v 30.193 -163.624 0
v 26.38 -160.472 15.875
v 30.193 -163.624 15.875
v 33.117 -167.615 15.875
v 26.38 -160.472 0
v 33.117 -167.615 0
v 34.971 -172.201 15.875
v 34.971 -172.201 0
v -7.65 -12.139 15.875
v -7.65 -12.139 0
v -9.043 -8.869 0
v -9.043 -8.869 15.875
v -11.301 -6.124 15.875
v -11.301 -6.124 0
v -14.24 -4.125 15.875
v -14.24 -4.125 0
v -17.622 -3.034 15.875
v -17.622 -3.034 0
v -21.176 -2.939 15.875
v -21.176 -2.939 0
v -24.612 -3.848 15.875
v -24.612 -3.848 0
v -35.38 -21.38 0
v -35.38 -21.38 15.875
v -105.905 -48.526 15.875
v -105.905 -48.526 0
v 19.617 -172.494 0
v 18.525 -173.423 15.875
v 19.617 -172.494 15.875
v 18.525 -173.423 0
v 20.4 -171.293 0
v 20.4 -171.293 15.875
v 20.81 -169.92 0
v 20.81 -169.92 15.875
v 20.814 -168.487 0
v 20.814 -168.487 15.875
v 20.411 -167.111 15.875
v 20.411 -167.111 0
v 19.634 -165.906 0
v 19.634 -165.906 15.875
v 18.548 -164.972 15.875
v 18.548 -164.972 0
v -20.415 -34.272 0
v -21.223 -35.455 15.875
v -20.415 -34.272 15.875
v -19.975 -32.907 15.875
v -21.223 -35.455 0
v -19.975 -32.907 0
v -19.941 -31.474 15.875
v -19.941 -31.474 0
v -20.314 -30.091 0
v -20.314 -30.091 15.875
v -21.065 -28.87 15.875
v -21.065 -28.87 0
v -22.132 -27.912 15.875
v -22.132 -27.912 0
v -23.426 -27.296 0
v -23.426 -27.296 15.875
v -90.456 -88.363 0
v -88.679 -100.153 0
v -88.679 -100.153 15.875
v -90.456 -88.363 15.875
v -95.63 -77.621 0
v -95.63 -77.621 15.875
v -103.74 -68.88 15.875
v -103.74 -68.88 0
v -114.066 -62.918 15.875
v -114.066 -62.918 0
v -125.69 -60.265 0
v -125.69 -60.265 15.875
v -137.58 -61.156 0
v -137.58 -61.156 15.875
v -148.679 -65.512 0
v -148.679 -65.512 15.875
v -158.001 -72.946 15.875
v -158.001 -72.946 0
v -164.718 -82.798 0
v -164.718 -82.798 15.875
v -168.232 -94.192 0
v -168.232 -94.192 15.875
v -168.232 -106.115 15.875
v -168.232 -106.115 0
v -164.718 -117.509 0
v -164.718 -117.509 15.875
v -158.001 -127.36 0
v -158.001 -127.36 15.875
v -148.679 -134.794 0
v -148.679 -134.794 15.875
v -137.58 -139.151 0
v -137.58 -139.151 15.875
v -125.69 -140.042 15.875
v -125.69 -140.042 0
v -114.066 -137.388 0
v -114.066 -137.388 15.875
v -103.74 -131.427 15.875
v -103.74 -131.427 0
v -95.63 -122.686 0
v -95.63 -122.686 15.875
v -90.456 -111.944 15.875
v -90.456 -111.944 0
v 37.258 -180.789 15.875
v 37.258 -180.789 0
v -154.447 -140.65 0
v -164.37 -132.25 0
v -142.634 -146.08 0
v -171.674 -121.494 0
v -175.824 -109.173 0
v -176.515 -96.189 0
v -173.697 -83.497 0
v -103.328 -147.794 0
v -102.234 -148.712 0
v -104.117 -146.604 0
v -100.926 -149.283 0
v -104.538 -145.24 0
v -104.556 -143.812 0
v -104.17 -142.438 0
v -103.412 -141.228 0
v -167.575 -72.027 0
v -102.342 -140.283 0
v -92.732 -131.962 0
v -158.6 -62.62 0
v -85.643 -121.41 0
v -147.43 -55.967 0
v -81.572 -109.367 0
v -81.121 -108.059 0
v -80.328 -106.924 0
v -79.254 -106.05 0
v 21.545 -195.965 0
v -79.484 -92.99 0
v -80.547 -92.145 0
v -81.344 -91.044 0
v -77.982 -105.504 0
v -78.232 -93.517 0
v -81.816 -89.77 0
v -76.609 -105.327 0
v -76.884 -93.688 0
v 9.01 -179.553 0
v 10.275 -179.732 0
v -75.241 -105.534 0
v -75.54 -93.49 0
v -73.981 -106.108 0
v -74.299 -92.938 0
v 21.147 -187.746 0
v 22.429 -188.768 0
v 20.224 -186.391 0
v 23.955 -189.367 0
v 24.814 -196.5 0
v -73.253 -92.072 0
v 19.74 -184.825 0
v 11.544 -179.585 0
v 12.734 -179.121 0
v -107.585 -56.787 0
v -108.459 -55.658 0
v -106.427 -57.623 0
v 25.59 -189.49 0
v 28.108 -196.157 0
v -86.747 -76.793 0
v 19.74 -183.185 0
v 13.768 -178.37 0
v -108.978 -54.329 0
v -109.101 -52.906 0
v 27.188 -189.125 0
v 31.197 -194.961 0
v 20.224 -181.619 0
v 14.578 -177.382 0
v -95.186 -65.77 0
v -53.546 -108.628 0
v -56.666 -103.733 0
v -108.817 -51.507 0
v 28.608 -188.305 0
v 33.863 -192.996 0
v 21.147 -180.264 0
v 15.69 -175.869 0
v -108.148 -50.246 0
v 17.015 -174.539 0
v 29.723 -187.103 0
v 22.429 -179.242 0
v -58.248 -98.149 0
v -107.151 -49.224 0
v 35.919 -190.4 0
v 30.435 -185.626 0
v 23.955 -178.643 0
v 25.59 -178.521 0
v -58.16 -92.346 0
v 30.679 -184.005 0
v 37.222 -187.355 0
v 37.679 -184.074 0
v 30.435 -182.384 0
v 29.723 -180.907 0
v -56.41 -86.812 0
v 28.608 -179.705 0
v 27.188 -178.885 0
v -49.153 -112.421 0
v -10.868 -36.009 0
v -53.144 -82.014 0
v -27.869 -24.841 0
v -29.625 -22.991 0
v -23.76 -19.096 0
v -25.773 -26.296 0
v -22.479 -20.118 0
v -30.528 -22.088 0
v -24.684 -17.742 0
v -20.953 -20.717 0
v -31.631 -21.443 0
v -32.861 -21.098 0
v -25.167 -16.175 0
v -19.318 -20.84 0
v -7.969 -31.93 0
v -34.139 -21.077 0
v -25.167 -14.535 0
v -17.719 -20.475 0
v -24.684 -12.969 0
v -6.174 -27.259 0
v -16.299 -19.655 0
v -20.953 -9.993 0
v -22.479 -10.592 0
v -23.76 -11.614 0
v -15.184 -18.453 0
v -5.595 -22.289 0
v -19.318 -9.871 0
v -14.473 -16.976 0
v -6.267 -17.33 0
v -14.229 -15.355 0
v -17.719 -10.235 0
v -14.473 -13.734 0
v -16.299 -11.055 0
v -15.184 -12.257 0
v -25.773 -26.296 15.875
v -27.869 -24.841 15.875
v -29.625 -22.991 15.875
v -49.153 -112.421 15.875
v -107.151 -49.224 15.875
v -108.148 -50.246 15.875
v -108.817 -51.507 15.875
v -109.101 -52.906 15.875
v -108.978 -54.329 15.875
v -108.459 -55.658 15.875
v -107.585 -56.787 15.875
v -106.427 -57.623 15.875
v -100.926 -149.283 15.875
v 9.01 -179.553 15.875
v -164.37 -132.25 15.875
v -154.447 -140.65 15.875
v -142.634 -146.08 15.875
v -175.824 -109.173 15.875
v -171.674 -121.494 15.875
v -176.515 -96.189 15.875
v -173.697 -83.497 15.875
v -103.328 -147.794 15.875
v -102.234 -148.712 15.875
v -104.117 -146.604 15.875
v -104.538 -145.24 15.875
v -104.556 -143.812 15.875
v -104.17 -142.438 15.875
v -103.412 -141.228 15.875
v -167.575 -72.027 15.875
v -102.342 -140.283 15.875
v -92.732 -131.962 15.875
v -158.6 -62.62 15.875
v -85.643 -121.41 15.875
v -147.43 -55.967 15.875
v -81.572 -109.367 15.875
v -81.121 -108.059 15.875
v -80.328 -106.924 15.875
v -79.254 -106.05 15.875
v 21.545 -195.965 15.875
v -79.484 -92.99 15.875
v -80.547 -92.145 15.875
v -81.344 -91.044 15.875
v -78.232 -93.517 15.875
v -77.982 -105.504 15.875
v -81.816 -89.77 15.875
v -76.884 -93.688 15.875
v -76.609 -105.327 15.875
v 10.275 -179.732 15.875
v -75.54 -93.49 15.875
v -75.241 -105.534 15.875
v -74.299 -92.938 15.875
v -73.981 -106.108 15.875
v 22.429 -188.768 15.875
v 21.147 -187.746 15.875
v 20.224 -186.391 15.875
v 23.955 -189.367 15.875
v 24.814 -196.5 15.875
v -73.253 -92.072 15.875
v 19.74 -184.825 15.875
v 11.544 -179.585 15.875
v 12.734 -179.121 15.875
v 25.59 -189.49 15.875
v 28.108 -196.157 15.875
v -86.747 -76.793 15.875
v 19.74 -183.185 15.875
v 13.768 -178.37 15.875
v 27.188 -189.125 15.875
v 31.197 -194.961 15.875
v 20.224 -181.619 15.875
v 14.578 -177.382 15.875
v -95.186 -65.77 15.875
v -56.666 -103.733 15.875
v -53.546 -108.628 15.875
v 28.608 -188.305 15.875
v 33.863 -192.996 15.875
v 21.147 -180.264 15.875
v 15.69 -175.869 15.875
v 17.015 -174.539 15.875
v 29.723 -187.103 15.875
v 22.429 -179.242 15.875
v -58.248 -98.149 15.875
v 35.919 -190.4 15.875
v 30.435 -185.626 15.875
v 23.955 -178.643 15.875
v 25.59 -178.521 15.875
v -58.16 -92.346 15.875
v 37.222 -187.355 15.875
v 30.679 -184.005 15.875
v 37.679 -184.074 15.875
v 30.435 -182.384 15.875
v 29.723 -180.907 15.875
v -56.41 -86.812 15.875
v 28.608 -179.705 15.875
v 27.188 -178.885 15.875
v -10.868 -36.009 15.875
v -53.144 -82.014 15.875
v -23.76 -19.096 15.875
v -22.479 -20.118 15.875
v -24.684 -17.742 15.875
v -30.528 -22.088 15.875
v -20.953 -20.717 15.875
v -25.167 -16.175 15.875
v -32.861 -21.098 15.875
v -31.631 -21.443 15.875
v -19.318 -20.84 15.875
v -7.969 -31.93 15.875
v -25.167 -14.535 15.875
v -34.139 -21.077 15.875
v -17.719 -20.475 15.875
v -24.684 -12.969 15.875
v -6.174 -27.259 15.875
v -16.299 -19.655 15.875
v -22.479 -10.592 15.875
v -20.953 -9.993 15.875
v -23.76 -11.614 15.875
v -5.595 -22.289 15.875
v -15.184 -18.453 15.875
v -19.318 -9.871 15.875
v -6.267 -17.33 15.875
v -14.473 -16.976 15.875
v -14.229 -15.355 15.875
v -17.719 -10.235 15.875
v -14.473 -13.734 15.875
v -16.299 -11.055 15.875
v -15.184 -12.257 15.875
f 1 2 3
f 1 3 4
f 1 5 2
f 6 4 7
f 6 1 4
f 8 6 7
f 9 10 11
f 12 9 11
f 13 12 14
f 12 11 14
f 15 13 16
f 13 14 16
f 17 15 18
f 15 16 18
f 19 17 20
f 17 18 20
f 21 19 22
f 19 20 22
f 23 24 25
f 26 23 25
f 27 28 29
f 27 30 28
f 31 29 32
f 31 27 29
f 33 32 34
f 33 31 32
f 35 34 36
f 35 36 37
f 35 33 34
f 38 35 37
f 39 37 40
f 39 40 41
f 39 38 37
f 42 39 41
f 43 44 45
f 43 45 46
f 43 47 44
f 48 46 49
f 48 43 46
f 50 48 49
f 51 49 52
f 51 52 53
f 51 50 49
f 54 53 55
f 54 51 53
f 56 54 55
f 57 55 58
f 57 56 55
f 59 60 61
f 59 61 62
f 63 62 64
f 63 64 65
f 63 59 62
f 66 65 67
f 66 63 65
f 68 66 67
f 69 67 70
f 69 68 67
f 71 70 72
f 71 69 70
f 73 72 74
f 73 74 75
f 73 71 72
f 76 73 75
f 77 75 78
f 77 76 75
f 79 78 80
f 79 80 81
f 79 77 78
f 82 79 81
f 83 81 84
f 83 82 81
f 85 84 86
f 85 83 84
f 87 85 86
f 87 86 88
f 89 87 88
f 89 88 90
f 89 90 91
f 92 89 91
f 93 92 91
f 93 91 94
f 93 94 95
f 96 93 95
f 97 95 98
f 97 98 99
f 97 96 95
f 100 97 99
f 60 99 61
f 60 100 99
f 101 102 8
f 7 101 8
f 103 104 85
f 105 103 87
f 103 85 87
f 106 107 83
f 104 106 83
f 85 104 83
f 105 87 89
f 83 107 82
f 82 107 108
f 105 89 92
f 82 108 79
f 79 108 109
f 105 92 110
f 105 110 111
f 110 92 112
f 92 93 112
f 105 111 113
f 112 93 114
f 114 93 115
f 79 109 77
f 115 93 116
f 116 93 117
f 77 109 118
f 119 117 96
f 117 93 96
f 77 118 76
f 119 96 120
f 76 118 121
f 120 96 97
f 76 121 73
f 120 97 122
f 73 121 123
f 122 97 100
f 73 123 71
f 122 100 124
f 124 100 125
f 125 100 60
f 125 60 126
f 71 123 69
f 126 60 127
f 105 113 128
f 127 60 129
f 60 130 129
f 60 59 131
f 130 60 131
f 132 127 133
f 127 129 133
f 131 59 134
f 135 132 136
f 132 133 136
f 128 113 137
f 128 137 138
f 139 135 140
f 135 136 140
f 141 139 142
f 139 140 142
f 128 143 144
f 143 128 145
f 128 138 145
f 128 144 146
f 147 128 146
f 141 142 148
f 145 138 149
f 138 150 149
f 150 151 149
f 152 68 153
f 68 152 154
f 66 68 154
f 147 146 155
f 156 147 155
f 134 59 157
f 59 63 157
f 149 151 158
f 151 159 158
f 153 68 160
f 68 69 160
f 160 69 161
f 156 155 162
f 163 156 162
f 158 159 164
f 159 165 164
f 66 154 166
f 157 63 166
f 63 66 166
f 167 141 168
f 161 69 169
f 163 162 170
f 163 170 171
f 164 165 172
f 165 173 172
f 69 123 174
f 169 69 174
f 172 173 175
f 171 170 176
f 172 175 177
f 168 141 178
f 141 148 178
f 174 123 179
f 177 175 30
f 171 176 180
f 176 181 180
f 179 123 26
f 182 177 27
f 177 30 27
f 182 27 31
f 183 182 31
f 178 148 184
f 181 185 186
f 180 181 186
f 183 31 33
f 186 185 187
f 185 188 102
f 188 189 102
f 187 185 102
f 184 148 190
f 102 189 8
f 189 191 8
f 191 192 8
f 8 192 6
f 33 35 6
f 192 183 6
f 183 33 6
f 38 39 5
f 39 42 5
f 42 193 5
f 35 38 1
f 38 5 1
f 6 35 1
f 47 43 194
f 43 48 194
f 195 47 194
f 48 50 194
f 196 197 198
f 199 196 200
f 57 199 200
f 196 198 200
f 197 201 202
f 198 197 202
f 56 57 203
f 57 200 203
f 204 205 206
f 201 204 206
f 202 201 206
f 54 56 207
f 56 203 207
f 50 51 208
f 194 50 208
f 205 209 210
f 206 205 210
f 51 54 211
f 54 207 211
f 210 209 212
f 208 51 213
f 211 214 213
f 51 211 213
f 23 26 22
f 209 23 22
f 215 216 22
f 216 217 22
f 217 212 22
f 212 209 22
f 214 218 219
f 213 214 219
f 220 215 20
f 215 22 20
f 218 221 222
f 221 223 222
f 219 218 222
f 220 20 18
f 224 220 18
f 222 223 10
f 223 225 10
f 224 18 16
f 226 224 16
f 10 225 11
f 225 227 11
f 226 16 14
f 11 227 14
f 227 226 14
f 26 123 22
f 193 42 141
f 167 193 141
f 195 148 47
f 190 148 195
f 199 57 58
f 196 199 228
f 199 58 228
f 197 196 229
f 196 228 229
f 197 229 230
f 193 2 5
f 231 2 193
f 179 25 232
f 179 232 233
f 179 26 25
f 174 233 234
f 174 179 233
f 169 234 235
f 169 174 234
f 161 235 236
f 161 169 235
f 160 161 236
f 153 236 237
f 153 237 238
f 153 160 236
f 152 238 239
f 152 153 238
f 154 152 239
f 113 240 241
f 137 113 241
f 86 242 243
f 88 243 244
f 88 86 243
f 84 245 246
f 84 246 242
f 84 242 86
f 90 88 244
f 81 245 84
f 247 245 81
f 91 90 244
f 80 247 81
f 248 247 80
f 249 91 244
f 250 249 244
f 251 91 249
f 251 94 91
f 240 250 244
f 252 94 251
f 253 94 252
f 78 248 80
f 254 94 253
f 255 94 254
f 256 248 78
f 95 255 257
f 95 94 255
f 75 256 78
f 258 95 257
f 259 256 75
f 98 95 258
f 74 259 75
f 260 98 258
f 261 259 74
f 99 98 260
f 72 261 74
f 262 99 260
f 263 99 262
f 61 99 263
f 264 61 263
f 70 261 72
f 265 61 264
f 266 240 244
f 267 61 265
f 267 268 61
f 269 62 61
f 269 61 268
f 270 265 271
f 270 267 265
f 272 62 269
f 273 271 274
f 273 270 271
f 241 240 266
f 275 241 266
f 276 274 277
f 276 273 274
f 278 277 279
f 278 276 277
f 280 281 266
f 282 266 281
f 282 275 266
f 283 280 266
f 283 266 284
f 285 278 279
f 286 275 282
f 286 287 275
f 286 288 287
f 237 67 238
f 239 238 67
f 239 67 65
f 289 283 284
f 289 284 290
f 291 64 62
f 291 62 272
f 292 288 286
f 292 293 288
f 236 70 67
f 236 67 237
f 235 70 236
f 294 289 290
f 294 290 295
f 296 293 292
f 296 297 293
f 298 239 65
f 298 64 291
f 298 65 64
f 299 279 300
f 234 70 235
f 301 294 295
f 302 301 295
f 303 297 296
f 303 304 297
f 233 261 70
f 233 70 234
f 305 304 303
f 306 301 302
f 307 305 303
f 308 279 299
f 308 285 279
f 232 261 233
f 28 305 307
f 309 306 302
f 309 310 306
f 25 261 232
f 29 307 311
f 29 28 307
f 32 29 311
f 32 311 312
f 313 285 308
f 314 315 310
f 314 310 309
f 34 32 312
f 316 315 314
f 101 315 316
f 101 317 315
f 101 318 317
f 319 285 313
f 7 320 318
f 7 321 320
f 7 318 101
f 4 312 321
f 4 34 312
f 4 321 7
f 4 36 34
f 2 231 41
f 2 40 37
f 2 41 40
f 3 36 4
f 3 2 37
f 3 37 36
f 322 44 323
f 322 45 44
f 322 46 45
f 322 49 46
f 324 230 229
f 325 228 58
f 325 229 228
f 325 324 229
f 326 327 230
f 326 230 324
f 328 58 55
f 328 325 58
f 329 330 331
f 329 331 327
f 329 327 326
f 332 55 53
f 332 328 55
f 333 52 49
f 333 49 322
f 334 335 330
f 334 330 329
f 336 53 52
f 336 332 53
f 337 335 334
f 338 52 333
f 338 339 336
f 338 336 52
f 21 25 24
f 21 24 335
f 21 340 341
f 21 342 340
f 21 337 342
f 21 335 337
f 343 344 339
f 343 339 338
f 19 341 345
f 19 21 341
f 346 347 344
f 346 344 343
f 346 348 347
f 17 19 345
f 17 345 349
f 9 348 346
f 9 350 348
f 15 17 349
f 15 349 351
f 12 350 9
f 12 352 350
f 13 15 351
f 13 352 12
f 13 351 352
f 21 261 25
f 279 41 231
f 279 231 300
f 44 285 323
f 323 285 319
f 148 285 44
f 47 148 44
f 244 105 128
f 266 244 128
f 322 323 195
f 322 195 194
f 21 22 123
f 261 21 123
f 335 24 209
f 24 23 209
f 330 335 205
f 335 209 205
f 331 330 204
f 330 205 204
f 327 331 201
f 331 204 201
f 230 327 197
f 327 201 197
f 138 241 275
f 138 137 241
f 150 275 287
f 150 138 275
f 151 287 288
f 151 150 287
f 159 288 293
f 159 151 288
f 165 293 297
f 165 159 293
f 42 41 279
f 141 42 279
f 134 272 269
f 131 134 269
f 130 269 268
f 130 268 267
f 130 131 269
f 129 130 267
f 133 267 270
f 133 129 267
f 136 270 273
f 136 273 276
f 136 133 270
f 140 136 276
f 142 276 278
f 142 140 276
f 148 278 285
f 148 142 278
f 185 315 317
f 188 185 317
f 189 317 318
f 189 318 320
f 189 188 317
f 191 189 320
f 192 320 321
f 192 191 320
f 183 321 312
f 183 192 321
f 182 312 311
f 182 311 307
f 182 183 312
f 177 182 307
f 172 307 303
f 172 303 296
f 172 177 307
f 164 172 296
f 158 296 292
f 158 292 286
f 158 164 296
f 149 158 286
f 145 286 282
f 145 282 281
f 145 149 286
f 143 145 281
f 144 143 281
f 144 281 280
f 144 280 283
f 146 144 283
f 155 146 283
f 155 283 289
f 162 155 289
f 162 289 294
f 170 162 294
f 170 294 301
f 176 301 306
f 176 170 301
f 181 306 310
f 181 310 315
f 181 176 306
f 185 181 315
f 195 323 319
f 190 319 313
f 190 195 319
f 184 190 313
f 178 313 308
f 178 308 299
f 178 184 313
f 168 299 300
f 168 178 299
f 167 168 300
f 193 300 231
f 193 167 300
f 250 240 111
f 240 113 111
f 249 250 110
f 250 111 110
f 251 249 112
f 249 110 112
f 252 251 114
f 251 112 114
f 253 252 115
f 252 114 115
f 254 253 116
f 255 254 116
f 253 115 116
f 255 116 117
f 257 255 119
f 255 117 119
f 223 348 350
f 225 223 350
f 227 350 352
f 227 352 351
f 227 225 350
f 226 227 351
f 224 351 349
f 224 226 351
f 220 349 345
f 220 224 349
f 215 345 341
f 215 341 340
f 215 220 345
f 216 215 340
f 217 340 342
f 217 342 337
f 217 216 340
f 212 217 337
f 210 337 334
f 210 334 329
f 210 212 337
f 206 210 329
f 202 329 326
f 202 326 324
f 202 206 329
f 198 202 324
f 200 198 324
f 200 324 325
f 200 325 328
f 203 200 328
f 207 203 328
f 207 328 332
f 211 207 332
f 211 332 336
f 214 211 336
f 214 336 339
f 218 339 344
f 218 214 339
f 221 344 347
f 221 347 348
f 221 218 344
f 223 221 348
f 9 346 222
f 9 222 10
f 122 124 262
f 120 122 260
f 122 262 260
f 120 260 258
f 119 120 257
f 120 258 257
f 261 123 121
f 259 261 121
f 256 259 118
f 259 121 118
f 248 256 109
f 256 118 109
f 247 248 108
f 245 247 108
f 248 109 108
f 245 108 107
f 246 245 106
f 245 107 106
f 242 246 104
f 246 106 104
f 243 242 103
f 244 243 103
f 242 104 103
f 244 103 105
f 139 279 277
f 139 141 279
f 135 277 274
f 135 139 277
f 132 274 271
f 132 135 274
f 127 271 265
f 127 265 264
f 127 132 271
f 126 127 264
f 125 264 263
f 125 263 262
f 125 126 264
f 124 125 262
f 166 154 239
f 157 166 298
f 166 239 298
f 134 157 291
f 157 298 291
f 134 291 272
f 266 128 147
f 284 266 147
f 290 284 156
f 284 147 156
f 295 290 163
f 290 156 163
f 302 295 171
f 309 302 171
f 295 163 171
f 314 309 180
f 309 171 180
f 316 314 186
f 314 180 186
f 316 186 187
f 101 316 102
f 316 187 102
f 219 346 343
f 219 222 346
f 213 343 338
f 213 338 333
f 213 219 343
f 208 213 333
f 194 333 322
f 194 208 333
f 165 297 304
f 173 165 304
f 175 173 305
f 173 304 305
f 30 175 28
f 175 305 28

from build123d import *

# Parameters (mm, degrees)
SKETCH4_R           = 40
SKETCH4_R_2         = 5.5
BOSS_EXTRUDE1_DEPTH = 15.875
CUT_EXTRUDE2_DEPTH  = 265.729718277
FILLET1_R           = 5
CUT_EXTRUDE3_DEPTH  = 265.729718424
FILLET2_R           = 20


with BuildPart() as part:
    # Sketch4 → Boss-Extrude1 (new body)
    with BuildSketch(Plane.XY):
        with BuildLine():
            Line((-142.633865887, -146.080164327), (21.544941406, -195.965223983))
            ThreePointArc((21.544941406, -195.965223983), (33.862932788, -192.99616638), (37.258075063, -180.78874144))
            Line((37.258075063, -180.78874144), (-7.649527095, -12.138772571))
            ThreePointArc((-7.649527095, -12.138772571), (-14.239674224, -4.124786339), (-24.611636772, -3.848367419))
            Line((-24.611636772, -3.848367419), (-147.429933804, -55.967315581))
            ThreePointArc((-147.429933804, -55.967315581), (-176.611366682, -102.704491033), (-142.633865887, -146.080164327))
        make_face()
        with Locations((-128.679206861, -100.153402069)):
            Circle(SKETCH4_R, mode=Mode.SUBTRACT)
        with Locations((25.178967194, -184.005129645)):
            Circle(SKETCH4_R_2, mode=Mode.SUBTRACT)
        with Locations((-19.728634964, -15.355160776)):
            Circle(SKETCH4_R_2, mode=Mode.SUBTRACT)
    extrude(amount=BOSS_EXTRUDE1_DEPTH)

    # Sketch5 → Cut-Extrude2 (cut, through all)
    with BuildSketch(Plane.XY.offset(15.875)):
        with BuildLine():
            Line((-31.394262991, -19.845497372), (-118.286356862, -53.292024914))
            ThreePointArc((-118.286356862, -53.292024914), (-91.243550062, -70.110572642), (-80.679206861, -100.153402069))
            Line((-80.679206861, -100.153402069), (-10.524781522, -23.813238679))
            ThreePointArc((-10.524781522, -23.813238679), (-22.063335437, -27.635192278), (-31.394262991, -19.845497372))
        make_face()
        with BuildLine():
            ThreePointArc((-80.708447165, -101.828577911), (-90.303653302, -128.985968536), (-113.716587883, -145.761735006))
            Line((-113.716587883, -145.761735006), (13.127445592, -180.686873014))
            ThreePointArc((13.127445592, -180.686873014), (20.684837316, -172.340962438), (31.888396226, -173.458397351))
            Line((31.888396226, -173.458397351), (-80.708447165, -101.828577911))
        make_face()
    extrude(amount=-CUT_EXTRUDE2_DEPTH, mode=Mode.SUBTRACT)

    # Fillet1
    fillet1_edges = [part.edges().sort_by_distance(p)[0] for p in [
        (-31.394262991, -19.845497372, 7.9375),
        (-10.524781522, -23.813238679, 7.9375),
        (-80.679206861, -100.153402069, 7.9375),
        (-118.286356862, -53.292024914, 7.9375),
        (13.127445592, -180.686873014, 7.9375),
        (-113.716587883, -145.761735006, 7.9375),
        (-80.708447165, -101.828577911, 7.9375),
    ]]
    fillet(fillet1_edges, radius=FILLET1_R)
    fillet1_2_edges = [part.edges().sort_by_distance(p)[0] for p in [
        (31.888396226, -173.458397351, 7.9375),
    ]]
    fillet(fillet1_2_edges, radius=FILLET1_R)

    # Sketch6 → Cut-Extrude3 (cut, through all)
    with BuildSketch(Plane.XY.offset(15.875)):
        Polygon((-69.306214403, -99.600633953), (-3.444297399, -27.931462965), (32.963567977, -164.660770859), align=None)
    extrude(amount=-CUT_EXTRUDE3_DEPTH, mode=Mode.SUBTRACT)

    # Fillet2
    fillet2_edges = [part.edges().sort_by_distance(p)[0] for p in [
        (32.963567977, -164.660770859, 7.9375),
        (-69.306214403, -99.600633953, 7.9375),
        (-3.444297399, -27.931462965, 7.9375),
    ]]
    fillet(fillet2_edges, radius=FILLET2_R)


solid = part.part
